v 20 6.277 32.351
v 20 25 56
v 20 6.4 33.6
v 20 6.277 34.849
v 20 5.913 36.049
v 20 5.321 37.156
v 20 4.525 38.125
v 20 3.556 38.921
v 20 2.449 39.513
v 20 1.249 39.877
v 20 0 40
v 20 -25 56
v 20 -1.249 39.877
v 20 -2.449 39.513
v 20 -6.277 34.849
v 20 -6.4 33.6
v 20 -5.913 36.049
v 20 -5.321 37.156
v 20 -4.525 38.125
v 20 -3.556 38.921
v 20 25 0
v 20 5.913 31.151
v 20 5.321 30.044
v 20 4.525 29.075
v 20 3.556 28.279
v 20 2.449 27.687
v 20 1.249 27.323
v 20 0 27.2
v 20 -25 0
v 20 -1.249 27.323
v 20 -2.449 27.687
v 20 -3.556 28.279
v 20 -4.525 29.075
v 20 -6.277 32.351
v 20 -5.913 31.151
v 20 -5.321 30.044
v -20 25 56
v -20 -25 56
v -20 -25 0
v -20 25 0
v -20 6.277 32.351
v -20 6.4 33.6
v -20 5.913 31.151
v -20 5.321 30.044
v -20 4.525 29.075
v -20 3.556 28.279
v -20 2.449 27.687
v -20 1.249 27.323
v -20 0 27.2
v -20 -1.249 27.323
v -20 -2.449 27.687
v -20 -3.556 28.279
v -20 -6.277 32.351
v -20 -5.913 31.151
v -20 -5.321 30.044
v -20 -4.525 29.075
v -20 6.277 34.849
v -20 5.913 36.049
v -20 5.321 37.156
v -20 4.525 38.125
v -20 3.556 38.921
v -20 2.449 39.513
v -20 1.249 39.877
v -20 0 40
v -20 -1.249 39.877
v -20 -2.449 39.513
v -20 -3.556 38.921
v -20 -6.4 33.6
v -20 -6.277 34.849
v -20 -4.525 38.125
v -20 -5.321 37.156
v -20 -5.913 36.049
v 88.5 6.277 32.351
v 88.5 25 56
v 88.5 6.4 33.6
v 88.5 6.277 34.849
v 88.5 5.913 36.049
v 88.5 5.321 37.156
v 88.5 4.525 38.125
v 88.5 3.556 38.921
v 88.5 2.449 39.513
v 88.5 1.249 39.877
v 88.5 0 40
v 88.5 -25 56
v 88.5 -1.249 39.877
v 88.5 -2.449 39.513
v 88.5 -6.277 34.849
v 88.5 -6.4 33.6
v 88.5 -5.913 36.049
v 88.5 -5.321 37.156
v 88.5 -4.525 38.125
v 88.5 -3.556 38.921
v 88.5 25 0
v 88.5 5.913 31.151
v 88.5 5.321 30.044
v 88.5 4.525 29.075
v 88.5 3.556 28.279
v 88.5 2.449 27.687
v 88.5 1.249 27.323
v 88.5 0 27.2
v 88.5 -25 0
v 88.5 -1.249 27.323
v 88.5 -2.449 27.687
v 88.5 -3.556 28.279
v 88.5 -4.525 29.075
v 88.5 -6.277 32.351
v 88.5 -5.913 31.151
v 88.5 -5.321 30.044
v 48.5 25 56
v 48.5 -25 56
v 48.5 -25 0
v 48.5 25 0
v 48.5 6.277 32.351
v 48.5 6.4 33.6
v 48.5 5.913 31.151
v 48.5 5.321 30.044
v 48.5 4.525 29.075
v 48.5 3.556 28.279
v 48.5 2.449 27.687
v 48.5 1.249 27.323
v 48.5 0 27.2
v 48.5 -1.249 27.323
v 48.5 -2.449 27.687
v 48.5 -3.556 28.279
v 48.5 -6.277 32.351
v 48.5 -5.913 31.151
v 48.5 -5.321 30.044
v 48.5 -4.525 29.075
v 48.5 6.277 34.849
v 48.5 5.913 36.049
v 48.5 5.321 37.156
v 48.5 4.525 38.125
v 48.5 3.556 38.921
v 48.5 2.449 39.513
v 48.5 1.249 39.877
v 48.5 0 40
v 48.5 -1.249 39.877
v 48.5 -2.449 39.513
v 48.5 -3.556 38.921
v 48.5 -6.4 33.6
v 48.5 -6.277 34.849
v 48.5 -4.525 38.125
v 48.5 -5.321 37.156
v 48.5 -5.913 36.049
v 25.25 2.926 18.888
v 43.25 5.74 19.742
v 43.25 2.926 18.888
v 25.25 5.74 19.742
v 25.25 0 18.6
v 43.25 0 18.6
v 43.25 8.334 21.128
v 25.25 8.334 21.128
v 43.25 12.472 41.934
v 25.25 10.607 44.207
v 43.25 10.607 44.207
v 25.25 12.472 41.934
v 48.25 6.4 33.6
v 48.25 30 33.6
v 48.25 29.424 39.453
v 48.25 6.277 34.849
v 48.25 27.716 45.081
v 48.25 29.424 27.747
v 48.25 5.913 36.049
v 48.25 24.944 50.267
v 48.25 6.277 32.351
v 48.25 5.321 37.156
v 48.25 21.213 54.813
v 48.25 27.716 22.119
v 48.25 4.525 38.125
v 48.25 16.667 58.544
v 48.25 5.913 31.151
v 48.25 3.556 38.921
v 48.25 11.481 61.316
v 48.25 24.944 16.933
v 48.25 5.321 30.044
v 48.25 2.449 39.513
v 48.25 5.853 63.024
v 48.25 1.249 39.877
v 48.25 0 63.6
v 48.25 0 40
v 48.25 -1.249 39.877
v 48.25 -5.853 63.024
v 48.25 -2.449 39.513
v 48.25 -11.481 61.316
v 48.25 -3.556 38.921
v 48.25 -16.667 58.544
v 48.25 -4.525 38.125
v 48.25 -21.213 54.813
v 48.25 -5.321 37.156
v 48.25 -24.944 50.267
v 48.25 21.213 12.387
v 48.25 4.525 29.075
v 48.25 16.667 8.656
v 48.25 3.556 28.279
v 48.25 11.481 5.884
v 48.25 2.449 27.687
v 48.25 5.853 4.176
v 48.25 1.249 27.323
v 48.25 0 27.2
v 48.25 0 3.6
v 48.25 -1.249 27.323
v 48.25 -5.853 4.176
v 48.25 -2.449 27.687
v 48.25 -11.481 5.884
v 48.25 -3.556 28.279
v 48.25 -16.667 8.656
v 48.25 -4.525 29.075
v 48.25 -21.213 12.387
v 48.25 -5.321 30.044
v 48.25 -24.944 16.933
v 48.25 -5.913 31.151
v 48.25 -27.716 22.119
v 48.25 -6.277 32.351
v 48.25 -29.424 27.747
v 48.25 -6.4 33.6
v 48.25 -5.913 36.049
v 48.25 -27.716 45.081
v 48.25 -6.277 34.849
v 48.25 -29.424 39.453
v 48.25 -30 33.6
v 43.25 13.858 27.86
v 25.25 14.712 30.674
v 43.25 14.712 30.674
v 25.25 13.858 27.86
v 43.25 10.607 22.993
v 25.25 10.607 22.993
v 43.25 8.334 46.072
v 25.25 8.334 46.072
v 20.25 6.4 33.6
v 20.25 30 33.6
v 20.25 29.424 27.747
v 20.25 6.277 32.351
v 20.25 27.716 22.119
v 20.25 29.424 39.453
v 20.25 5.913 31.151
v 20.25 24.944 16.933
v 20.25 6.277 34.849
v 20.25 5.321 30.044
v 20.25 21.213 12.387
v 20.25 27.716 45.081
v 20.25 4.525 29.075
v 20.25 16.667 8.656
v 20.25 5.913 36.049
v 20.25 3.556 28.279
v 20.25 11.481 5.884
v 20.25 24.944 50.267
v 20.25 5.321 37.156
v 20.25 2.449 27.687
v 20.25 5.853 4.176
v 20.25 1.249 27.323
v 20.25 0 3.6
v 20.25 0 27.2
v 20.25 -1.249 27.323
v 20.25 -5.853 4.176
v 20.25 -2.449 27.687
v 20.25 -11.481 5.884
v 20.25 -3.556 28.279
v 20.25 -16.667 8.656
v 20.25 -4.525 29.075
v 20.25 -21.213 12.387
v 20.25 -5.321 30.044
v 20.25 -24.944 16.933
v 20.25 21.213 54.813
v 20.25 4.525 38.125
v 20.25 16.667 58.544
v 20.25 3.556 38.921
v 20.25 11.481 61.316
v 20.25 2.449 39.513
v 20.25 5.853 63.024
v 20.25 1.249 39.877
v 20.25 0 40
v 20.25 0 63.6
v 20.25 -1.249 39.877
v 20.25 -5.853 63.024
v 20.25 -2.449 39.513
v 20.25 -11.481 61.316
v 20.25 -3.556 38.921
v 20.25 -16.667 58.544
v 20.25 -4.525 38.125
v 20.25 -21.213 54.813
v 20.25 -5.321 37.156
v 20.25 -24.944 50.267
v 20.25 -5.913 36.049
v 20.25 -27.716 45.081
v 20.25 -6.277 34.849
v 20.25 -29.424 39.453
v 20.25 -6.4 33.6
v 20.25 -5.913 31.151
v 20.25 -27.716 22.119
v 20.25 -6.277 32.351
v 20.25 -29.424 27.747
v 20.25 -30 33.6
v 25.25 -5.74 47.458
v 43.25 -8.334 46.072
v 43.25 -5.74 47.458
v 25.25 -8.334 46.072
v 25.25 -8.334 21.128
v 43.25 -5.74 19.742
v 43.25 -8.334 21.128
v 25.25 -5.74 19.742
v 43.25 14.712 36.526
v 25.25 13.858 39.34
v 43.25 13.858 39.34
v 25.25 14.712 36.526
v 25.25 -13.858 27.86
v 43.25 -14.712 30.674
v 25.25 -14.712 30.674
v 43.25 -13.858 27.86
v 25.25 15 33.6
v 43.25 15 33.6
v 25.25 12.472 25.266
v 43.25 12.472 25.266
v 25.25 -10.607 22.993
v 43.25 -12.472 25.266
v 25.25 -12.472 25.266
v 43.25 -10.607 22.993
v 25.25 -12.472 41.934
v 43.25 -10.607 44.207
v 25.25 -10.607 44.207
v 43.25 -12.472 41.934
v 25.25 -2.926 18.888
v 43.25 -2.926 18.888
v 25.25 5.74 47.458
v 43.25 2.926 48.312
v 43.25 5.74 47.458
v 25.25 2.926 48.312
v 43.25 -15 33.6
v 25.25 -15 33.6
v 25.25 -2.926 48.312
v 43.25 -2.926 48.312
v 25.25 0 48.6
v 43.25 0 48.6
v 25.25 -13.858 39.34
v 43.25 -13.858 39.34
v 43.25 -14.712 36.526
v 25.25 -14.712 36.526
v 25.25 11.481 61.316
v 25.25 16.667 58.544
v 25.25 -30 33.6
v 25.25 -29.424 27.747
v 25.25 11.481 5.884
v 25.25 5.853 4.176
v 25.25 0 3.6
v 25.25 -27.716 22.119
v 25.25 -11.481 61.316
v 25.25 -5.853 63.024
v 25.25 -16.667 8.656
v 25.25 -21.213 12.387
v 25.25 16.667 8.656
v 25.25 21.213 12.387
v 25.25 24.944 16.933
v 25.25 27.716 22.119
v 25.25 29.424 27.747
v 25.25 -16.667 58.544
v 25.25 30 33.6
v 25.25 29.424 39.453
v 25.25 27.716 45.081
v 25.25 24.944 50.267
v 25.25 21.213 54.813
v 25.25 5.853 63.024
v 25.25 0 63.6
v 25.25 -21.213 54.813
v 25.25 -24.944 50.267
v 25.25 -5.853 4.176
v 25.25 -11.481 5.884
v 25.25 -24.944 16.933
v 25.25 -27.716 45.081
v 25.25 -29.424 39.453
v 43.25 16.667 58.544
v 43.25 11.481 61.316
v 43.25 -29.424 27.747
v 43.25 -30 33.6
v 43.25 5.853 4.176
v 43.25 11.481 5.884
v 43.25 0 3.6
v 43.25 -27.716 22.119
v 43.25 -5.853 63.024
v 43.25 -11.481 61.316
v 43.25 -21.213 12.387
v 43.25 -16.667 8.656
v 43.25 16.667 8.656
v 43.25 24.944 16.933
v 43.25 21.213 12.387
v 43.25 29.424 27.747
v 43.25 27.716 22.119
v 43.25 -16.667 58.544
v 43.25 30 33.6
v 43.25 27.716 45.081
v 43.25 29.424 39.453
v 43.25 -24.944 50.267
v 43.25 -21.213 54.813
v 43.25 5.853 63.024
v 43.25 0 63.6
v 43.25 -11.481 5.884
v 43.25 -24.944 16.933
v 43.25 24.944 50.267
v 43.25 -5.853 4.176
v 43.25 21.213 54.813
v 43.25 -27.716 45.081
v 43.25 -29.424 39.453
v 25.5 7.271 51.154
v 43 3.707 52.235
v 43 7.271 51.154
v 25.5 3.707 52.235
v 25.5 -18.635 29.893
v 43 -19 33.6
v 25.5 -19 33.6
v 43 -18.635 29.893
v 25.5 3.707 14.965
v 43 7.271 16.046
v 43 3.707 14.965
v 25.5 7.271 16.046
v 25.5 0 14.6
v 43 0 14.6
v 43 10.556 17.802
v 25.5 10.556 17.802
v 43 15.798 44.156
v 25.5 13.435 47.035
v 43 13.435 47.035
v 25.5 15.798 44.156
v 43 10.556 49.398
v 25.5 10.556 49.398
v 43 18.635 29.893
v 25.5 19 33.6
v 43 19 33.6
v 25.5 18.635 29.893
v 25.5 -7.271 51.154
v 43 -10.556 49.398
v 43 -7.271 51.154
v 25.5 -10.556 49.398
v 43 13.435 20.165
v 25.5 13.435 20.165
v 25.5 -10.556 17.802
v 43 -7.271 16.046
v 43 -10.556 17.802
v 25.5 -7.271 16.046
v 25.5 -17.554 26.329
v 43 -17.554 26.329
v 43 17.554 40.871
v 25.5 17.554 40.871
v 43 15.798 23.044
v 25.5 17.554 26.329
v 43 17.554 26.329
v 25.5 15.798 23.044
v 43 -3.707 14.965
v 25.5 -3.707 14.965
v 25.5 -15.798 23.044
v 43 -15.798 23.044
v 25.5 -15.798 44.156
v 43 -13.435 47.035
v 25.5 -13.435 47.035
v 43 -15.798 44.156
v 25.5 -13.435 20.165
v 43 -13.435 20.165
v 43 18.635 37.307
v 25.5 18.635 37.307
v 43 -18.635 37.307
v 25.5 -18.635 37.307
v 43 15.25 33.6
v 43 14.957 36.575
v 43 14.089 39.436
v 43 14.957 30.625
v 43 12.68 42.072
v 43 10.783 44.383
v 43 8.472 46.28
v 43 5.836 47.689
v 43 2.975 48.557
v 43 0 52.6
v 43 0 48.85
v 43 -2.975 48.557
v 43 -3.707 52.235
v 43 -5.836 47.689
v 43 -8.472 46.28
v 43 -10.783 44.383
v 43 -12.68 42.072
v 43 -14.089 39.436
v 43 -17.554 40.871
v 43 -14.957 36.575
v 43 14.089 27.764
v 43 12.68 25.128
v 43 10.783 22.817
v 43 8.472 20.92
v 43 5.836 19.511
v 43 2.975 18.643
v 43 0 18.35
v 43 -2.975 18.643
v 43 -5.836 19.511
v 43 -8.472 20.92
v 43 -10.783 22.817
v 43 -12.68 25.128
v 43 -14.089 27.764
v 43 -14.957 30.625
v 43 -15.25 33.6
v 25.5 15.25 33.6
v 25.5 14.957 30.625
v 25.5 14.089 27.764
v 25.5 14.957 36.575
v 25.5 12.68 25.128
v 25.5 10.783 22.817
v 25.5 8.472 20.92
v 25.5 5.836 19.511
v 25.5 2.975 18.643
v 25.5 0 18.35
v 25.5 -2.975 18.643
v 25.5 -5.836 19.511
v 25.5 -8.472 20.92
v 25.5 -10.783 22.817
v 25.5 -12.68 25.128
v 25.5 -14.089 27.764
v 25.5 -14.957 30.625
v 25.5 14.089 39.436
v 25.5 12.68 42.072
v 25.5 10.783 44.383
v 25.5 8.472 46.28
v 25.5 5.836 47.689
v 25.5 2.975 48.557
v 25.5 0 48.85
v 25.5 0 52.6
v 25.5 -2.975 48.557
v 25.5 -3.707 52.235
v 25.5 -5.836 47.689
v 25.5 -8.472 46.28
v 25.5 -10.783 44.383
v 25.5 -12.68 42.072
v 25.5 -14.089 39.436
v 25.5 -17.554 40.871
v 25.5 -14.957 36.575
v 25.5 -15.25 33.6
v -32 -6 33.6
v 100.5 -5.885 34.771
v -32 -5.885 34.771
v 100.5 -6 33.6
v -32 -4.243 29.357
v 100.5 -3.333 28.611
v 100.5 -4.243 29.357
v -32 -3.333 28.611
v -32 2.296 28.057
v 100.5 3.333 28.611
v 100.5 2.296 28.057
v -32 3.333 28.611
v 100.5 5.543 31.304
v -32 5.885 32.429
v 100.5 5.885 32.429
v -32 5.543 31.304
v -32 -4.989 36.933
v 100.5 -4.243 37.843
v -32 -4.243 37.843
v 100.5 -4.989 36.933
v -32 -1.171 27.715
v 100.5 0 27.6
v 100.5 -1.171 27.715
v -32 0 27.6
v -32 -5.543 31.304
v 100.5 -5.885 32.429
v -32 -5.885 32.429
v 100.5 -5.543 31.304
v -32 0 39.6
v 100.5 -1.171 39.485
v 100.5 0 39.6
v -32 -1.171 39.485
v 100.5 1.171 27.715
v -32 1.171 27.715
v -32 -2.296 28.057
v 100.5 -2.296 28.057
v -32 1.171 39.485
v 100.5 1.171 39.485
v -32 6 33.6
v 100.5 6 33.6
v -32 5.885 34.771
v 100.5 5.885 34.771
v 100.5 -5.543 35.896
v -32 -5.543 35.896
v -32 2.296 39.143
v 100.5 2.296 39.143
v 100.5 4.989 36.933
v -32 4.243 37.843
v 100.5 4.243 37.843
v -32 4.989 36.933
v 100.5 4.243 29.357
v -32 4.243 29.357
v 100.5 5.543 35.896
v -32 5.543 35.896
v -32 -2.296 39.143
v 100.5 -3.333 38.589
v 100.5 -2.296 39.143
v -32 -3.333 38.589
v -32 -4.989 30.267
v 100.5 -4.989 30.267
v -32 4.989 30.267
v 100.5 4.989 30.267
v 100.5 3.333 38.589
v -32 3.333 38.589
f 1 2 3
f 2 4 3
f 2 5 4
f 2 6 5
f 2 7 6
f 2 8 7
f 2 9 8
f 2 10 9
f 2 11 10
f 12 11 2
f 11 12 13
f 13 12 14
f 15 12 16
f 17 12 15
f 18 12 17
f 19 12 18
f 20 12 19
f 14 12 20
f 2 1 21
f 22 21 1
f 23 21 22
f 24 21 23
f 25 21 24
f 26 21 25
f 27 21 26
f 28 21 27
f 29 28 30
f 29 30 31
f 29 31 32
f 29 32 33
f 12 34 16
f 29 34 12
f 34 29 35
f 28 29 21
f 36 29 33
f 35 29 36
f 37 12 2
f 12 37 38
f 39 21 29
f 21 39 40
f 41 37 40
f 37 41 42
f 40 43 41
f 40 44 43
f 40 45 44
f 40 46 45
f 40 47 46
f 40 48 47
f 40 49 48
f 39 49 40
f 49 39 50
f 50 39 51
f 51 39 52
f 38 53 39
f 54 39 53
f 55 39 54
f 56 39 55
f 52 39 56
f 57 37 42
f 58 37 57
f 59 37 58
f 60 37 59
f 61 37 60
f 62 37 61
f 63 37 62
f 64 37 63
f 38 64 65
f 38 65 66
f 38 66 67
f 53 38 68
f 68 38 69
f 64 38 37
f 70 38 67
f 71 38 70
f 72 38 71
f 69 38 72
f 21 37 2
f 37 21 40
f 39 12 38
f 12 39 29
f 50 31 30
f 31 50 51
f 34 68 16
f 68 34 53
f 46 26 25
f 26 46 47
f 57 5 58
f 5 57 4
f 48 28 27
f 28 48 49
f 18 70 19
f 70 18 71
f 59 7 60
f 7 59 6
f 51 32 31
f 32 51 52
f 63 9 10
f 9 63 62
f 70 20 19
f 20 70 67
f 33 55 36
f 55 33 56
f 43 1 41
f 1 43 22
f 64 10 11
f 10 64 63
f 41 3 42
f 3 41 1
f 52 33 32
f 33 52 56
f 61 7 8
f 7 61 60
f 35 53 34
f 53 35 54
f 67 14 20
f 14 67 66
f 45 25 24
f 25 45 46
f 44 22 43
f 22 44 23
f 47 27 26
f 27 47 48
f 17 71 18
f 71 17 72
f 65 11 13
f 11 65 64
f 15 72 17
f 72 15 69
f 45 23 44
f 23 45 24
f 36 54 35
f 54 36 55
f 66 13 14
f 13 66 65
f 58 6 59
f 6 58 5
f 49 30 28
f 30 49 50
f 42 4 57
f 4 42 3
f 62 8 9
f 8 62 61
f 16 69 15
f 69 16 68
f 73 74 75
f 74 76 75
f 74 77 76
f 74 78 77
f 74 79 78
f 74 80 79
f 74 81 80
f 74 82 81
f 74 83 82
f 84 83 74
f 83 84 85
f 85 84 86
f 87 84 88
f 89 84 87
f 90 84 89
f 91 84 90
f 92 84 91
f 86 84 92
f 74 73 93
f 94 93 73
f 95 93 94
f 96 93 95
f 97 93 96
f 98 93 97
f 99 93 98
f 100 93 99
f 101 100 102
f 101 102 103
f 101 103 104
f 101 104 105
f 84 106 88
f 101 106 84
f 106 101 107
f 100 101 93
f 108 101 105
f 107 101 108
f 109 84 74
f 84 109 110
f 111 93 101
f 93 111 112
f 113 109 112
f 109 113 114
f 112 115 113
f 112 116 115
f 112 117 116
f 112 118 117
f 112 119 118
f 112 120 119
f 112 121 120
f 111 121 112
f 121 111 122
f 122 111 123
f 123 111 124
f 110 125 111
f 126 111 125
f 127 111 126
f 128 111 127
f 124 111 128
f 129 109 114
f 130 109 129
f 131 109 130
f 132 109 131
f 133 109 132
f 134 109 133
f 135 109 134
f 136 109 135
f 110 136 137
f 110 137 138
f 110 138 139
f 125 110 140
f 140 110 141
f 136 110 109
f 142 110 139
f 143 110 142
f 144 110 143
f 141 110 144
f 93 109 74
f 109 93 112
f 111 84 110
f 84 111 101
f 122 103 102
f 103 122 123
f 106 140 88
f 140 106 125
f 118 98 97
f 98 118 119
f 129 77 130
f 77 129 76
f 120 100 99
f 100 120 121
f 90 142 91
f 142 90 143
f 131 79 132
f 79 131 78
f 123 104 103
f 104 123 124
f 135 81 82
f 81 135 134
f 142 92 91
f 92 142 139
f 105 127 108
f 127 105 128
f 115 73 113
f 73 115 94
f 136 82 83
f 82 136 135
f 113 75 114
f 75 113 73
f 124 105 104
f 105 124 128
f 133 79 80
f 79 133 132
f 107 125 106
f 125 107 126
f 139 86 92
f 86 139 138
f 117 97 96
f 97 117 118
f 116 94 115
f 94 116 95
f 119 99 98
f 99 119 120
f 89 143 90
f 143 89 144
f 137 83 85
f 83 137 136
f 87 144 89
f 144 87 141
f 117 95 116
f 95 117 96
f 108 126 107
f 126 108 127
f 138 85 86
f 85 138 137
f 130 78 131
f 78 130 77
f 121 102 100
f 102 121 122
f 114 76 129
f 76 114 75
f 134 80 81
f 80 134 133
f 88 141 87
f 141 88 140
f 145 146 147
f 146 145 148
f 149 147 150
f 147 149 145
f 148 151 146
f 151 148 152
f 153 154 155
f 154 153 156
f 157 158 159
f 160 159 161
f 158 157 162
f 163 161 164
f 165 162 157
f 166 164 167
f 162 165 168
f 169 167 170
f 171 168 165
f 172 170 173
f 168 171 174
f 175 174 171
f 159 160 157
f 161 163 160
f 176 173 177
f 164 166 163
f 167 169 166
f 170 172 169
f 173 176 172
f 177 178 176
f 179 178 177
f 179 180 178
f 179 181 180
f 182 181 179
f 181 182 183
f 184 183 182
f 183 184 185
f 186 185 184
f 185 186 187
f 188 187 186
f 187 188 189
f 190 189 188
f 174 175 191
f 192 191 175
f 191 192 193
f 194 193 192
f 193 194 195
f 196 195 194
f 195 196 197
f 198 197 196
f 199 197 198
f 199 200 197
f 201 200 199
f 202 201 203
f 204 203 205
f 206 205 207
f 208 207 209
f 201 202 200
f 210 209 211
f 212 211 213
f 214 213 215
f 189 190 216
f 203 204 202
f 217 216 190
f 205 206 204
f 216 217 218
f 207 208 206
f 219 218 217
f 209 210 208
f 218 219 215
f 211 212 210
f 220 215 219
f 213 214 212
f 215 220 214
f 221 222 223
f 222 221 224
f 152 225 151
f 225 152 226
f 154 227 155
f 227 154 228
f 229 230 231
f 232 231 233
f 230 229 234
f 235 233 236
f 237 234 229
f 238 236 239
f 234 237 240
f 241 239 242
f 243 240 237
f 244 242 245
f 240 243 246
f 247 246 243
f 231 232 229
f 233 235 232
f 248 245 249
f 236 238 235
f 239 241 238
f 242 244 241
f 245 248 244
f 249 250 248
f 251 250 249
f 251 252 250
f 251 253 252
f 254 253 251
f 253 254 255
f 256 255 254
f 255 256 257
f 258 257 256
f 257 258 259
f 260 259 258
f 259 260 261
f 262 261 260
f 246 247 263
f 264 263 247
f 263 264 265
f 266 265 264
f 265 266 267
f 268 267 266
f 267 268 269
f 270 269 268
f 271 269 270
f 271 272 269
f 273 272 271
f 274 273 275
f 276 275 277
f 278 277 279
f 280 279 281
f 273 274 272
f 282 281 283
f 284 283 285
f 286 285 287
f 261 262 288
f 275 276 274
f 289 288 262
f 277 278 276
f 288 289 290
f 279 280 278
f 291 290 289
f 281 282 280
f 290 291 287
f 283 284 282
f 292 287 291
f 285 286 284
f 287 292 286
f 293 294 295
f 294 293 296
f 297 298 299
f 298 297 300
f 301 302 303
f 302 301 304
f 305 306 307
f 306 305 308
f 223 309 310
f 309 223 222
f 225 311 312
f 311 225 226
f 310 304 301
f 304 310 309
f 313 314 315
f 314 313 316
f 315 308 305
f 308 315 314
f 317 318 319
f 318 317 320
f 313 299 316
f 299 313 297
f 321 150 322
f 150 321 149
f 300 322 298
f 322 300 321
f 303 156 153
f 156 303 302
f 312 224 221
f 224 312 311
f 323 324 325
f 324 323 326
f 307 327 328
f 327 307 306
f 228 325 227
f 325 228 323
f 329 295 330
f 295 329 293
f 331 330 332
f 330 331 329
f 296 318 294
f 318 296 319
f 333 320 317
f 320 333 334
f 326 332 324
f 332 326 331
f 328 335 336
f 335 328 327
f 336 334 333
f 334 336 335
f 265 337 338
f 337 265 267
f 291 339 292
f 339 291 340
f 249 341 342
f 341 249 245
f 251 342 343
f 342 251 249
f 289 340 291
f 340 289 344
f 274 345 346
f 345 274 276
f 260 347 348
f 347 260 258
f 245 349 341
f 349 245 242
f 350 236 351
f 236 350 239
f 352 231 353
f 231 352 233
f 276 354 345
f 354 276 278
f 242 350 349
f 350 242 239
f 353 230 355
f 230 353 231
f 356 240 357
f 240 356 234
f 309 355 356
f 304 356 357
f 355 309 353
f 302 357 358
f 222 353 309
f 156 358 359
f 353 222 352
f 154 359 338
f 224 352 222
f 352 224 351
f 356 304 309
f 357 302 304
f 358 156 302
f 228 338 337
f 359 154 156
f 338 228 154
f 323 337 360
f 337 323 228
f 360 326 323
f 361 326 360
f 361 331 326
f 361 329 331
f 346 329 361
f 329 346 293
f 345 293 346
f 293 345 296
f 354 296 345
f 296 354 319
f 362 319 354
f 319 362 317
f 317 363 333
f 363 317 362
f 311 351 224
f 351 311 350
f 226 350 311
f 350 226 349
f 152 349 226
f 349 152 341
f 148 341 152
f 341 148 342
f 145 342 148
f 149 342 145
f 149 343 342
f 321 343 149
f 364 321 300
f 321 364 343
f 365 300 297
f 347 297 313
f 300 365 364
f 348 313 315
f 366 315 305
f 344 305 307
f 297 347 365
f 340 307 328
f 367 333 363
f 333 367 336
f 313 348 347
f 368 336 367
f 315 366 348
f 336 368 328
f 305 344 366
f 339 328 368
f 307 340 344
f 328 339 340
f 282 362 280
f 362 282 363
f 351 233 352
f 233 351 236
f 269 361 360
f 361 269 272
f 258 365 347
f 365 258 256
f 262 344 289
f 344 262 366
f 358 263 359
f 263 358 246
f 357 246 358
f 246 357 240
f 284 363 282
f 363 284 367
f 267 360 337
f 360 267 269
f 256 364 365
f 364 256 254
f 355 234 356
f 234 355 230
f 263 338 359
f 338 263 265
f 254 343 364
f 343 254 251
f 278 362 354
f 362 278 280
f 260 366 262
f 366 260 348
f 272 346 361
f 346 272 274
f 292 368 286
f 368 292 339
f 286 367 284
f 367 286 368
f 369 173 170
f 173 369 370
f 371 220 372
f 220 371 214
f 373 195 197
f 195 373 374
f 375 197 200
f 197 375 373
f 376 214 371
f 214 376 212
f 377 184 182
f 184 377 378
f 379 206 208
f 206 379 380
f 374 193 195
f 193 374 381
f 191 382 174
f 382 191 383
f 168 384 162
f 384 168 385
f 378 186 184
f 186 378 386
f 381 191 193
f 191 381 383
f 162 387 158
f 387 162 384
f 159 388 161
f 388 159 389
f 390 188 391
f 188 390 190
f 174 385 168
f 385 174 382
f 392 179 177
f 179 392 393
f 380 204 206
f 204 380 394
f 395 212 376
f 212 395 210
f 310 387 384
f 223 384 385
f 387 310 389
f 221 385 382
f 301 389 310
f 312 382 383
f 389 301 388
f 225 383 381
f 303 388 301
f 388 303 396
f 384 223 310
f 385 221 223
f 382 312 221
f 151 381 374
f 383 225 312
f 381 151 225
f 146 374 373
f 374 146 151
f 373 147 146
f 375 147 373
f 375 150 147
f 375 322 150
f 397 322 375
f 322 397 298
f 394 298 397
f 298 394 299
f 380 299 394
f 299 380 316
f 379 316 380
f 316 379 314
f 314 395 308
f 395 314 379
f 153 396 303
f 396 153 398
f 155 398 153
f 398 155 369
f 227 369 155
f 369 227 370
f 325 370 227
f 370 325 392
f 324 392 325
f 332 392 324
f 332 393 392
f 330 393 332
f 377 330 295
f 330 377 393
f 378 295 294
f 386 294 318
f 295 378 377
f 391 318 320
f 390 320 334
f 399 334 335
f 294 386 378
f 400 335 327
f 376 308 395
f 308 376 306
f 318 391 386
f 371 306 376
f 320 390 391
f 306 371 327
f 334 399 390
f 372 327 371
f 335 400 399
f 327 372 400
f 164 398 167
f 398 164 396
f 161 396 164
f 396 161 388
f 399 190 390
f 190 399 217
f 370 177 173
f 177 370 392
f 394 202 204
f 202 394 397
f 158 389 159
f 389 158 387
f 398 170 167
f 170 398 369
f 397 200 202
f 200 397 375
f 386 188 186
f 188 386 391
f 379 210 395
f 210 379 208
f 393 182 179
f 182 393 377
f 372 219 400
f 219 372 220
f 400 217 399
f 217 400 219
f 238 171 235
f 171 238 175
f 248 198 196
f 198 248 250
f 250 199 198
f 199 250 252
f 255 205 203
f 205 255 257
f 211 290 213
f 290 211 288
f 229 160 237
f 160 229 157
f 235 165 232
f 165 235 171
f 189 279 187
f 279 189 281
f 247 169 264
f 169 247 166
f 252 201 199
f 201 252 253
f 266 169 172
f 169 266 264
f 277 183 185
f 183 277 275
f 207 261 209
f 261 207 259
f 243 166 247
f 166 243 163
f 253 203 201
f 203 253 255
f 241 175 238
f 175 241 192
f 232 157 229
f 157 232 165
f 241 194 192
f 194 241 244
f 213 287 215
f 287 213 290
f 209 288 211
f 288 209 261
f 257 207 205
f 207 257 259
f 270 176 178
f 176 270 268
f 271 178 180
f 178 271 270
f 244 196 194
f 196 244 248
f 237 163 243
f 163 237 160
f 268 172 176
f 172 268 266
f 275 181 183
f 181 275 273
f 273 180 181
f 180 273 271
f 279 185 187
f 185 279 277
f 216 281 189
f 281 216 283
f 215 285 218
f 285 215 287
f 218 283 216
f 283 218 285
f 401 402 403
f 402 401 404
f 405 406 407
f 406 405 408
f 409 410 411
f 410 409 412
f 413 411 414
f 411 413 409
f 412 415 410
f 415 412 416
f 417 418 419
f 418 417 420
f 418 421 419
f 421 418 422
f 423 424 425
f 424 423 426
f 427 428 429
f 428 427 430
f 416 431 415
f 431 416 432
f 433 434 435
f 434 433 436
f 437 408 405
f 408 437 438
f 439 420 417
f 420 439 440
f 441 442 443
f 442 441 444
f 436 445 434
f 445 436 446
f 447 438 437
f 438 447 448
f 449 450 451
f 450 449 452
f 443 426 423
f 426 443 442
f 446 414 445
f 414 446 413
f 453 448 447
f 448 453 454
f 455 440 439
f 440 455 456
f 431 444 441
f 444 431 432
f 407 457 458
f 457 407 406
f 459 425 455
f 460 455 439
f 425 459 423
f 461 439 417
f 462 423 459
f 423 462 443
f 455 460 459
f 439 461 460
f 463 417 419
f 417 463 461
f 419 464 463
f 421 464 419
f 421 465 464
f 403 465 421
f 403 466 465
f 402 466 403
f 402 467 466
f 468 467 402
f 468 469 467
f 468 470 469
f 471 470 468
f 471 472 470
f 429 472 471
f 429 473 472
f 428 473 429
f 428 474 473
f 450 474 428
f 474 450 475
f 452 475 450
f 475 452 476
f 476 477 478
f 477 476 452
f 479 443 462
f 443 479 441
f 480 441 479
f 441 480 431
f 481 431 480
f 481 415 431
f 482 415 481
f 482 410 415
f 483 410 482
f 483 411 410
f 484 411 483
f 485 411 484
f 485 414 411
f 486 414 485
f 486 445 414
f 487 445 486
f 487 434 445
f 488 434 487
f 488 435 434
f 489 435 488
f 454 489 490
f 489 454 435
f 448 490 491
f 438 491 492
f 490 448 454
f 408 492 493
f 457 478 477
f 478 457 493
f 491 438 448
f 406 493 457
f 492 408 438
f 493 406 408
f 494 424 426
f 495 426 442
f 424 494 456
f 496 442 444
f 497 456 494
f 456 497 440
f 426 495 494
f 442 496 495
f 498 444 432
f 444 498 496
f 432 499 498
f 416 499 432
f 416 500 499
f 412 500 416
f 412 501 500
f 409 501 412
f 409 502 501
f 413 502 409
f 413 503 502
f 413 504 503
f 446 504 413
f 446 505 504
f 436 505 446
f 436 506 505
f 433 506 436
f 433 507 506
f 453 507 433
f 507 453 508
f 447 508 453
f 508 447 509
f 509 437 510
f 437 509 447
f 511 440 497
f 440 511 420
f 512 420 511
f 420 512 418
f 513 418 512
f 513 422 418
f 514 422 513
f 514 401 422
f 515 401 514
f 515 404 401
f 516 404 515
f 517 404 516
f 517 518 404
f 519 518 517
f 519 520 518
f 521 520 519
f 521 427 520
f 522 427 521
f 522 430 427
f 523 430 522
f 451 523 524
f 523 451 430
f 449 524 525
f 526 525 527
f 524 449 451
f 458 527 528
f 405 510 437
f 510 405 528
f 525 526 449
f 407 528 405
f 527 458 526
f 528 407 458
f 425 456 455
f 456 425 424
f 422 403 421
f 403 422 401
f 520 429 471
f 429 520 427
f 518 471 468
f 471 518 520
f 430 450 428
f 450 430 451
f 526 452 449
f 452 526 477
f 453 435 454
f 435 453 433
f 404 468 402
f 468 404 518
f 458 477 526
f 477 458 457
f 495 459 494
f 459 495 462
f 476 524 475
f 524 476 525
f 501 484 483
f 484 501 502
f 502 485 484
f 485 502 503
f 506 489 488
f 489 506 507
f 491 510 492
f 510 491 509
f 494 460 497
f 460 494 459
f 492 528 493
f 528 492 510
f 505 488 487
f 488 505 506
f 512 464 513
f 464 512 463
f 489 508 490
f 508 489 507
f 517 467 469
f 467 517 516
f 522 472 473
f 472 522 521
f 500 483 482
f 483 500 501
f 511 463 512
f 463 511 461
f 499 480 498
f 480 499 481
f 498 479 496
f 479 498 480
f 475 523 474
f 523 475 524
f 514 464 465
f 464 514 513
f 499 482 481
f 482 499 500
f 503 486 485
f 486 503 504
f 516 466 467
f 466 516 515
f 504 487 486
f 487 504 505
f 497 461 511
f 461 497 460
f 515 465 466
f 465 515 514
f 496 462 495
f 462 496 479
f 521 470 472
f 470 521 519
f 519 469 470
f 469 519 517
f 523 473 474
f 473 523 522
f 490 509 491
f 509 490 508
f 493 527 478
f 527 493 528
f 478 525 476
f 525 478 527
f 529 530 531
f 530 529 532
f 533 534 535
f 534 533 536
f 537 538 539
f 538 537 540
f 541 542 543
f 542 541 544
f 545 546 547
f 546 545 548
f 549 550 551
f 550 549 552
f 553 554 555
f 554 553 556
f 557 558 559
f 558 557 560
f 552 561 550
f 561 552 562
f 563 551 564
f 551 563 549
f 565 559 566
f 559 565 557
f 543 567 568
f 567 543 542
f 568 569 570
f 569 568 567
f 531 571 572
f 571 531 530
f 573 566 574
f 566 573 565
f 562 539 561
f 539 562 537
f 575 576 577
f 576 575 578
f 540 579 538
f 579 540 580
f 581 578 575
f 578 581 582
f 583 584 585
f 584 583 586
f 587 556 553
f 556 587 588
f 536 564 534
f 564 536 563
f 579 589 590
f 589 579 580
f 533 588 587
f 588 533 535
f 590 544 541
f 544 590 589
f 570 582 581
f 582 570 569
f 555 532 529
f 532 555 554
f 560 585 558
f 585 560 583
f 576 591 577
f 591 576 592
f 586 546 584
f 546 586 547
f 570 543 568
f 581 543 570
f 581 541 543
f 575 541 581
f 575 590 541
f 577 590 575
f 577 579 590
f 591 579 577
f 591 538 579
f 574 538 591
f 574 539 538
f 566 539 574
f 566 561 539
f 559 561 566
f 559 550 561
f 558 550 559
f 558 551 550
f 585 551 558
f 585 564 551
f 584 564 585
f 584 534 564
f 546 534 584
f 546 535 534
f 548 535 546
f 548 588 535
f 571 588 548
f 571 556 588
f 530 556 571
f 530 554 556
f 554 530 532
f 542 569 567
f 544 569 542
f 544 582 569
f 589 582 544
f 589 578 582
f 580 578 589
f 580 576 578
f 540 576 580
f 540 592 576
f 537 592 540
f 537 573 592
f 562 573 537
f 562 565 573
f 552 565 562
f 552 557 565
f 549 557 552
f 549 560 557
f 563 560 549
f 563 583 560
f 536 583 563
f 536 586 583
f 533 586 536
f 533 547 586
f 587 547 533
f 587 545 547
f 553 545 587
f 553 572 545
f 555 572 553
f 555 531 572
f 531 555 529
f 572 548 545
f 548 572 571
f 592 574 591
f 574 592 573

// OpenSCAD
$fn = 32;

// ------------------------------------------------------------------------
// Pulley assembly: d60 pulley with a belt, shaft d12
// Every part is its own module, assembly() places them once.
// ------------------------------------------------------------------------

// --- part 1 ---
module support1() {
  difference() {
    translate([-20, -25, 0]) cube([40, 50, 56]);
    translate([0, 0, 33.6]) rotate([0, 90, 0]) cylinder(h = 42, d = 12.8, center = true);
  }
}

// --- part 2 ---
module support2() {
  difference() {
    translate([-20, -25, 0]) cube([40, 50, 56]);
    translate([0, 0, 33.6]) rotate([0, 90, 0]) cylinder(h = 42, d = 12.8, center = true);
  }
}

// --- part 3 ---
module shaft() {
  translate([0, 0, -66.25]) cylinder(h = 132.5, d = 12);
}

// --- part 4 ---
module pulley() {
  difference() {
    union() {
      cylinder(h = 28, d = 30);
      cylinder(h = 5, d = 60);
      translate([0, 0, 23]) cylinder(h = 5, d = 60);
    }
    translate([0, 0, -1]) cylinder(h = 30, d = 12.8);
  }
}

// --- part 5 ---
module belt() {
  difference() {
      translate([0, 0, 0]) cylinder(h = 17.5, d = 38);
      translate([0, 0, -1]) cylinder(h = 19.5, d = 30.5);
    }
}

// --- assembly ---
module assembly() {
  translate([0, 0, 0]) rotate([0, 0, 0]) support1();
  translate([68.5, 0, 0]) rotate([0, 0, 0]) support2();
  translate([34.25, 0, 33.6]) rotate([0, 90, 0]) shaft();
  translate([20.25, 0, 33.6]) rotate([0, 90, 0]) pulley();
  translate([25.5, 0, 33.6]) rotate([0, 90, 0]) belt();
}

assembly();
